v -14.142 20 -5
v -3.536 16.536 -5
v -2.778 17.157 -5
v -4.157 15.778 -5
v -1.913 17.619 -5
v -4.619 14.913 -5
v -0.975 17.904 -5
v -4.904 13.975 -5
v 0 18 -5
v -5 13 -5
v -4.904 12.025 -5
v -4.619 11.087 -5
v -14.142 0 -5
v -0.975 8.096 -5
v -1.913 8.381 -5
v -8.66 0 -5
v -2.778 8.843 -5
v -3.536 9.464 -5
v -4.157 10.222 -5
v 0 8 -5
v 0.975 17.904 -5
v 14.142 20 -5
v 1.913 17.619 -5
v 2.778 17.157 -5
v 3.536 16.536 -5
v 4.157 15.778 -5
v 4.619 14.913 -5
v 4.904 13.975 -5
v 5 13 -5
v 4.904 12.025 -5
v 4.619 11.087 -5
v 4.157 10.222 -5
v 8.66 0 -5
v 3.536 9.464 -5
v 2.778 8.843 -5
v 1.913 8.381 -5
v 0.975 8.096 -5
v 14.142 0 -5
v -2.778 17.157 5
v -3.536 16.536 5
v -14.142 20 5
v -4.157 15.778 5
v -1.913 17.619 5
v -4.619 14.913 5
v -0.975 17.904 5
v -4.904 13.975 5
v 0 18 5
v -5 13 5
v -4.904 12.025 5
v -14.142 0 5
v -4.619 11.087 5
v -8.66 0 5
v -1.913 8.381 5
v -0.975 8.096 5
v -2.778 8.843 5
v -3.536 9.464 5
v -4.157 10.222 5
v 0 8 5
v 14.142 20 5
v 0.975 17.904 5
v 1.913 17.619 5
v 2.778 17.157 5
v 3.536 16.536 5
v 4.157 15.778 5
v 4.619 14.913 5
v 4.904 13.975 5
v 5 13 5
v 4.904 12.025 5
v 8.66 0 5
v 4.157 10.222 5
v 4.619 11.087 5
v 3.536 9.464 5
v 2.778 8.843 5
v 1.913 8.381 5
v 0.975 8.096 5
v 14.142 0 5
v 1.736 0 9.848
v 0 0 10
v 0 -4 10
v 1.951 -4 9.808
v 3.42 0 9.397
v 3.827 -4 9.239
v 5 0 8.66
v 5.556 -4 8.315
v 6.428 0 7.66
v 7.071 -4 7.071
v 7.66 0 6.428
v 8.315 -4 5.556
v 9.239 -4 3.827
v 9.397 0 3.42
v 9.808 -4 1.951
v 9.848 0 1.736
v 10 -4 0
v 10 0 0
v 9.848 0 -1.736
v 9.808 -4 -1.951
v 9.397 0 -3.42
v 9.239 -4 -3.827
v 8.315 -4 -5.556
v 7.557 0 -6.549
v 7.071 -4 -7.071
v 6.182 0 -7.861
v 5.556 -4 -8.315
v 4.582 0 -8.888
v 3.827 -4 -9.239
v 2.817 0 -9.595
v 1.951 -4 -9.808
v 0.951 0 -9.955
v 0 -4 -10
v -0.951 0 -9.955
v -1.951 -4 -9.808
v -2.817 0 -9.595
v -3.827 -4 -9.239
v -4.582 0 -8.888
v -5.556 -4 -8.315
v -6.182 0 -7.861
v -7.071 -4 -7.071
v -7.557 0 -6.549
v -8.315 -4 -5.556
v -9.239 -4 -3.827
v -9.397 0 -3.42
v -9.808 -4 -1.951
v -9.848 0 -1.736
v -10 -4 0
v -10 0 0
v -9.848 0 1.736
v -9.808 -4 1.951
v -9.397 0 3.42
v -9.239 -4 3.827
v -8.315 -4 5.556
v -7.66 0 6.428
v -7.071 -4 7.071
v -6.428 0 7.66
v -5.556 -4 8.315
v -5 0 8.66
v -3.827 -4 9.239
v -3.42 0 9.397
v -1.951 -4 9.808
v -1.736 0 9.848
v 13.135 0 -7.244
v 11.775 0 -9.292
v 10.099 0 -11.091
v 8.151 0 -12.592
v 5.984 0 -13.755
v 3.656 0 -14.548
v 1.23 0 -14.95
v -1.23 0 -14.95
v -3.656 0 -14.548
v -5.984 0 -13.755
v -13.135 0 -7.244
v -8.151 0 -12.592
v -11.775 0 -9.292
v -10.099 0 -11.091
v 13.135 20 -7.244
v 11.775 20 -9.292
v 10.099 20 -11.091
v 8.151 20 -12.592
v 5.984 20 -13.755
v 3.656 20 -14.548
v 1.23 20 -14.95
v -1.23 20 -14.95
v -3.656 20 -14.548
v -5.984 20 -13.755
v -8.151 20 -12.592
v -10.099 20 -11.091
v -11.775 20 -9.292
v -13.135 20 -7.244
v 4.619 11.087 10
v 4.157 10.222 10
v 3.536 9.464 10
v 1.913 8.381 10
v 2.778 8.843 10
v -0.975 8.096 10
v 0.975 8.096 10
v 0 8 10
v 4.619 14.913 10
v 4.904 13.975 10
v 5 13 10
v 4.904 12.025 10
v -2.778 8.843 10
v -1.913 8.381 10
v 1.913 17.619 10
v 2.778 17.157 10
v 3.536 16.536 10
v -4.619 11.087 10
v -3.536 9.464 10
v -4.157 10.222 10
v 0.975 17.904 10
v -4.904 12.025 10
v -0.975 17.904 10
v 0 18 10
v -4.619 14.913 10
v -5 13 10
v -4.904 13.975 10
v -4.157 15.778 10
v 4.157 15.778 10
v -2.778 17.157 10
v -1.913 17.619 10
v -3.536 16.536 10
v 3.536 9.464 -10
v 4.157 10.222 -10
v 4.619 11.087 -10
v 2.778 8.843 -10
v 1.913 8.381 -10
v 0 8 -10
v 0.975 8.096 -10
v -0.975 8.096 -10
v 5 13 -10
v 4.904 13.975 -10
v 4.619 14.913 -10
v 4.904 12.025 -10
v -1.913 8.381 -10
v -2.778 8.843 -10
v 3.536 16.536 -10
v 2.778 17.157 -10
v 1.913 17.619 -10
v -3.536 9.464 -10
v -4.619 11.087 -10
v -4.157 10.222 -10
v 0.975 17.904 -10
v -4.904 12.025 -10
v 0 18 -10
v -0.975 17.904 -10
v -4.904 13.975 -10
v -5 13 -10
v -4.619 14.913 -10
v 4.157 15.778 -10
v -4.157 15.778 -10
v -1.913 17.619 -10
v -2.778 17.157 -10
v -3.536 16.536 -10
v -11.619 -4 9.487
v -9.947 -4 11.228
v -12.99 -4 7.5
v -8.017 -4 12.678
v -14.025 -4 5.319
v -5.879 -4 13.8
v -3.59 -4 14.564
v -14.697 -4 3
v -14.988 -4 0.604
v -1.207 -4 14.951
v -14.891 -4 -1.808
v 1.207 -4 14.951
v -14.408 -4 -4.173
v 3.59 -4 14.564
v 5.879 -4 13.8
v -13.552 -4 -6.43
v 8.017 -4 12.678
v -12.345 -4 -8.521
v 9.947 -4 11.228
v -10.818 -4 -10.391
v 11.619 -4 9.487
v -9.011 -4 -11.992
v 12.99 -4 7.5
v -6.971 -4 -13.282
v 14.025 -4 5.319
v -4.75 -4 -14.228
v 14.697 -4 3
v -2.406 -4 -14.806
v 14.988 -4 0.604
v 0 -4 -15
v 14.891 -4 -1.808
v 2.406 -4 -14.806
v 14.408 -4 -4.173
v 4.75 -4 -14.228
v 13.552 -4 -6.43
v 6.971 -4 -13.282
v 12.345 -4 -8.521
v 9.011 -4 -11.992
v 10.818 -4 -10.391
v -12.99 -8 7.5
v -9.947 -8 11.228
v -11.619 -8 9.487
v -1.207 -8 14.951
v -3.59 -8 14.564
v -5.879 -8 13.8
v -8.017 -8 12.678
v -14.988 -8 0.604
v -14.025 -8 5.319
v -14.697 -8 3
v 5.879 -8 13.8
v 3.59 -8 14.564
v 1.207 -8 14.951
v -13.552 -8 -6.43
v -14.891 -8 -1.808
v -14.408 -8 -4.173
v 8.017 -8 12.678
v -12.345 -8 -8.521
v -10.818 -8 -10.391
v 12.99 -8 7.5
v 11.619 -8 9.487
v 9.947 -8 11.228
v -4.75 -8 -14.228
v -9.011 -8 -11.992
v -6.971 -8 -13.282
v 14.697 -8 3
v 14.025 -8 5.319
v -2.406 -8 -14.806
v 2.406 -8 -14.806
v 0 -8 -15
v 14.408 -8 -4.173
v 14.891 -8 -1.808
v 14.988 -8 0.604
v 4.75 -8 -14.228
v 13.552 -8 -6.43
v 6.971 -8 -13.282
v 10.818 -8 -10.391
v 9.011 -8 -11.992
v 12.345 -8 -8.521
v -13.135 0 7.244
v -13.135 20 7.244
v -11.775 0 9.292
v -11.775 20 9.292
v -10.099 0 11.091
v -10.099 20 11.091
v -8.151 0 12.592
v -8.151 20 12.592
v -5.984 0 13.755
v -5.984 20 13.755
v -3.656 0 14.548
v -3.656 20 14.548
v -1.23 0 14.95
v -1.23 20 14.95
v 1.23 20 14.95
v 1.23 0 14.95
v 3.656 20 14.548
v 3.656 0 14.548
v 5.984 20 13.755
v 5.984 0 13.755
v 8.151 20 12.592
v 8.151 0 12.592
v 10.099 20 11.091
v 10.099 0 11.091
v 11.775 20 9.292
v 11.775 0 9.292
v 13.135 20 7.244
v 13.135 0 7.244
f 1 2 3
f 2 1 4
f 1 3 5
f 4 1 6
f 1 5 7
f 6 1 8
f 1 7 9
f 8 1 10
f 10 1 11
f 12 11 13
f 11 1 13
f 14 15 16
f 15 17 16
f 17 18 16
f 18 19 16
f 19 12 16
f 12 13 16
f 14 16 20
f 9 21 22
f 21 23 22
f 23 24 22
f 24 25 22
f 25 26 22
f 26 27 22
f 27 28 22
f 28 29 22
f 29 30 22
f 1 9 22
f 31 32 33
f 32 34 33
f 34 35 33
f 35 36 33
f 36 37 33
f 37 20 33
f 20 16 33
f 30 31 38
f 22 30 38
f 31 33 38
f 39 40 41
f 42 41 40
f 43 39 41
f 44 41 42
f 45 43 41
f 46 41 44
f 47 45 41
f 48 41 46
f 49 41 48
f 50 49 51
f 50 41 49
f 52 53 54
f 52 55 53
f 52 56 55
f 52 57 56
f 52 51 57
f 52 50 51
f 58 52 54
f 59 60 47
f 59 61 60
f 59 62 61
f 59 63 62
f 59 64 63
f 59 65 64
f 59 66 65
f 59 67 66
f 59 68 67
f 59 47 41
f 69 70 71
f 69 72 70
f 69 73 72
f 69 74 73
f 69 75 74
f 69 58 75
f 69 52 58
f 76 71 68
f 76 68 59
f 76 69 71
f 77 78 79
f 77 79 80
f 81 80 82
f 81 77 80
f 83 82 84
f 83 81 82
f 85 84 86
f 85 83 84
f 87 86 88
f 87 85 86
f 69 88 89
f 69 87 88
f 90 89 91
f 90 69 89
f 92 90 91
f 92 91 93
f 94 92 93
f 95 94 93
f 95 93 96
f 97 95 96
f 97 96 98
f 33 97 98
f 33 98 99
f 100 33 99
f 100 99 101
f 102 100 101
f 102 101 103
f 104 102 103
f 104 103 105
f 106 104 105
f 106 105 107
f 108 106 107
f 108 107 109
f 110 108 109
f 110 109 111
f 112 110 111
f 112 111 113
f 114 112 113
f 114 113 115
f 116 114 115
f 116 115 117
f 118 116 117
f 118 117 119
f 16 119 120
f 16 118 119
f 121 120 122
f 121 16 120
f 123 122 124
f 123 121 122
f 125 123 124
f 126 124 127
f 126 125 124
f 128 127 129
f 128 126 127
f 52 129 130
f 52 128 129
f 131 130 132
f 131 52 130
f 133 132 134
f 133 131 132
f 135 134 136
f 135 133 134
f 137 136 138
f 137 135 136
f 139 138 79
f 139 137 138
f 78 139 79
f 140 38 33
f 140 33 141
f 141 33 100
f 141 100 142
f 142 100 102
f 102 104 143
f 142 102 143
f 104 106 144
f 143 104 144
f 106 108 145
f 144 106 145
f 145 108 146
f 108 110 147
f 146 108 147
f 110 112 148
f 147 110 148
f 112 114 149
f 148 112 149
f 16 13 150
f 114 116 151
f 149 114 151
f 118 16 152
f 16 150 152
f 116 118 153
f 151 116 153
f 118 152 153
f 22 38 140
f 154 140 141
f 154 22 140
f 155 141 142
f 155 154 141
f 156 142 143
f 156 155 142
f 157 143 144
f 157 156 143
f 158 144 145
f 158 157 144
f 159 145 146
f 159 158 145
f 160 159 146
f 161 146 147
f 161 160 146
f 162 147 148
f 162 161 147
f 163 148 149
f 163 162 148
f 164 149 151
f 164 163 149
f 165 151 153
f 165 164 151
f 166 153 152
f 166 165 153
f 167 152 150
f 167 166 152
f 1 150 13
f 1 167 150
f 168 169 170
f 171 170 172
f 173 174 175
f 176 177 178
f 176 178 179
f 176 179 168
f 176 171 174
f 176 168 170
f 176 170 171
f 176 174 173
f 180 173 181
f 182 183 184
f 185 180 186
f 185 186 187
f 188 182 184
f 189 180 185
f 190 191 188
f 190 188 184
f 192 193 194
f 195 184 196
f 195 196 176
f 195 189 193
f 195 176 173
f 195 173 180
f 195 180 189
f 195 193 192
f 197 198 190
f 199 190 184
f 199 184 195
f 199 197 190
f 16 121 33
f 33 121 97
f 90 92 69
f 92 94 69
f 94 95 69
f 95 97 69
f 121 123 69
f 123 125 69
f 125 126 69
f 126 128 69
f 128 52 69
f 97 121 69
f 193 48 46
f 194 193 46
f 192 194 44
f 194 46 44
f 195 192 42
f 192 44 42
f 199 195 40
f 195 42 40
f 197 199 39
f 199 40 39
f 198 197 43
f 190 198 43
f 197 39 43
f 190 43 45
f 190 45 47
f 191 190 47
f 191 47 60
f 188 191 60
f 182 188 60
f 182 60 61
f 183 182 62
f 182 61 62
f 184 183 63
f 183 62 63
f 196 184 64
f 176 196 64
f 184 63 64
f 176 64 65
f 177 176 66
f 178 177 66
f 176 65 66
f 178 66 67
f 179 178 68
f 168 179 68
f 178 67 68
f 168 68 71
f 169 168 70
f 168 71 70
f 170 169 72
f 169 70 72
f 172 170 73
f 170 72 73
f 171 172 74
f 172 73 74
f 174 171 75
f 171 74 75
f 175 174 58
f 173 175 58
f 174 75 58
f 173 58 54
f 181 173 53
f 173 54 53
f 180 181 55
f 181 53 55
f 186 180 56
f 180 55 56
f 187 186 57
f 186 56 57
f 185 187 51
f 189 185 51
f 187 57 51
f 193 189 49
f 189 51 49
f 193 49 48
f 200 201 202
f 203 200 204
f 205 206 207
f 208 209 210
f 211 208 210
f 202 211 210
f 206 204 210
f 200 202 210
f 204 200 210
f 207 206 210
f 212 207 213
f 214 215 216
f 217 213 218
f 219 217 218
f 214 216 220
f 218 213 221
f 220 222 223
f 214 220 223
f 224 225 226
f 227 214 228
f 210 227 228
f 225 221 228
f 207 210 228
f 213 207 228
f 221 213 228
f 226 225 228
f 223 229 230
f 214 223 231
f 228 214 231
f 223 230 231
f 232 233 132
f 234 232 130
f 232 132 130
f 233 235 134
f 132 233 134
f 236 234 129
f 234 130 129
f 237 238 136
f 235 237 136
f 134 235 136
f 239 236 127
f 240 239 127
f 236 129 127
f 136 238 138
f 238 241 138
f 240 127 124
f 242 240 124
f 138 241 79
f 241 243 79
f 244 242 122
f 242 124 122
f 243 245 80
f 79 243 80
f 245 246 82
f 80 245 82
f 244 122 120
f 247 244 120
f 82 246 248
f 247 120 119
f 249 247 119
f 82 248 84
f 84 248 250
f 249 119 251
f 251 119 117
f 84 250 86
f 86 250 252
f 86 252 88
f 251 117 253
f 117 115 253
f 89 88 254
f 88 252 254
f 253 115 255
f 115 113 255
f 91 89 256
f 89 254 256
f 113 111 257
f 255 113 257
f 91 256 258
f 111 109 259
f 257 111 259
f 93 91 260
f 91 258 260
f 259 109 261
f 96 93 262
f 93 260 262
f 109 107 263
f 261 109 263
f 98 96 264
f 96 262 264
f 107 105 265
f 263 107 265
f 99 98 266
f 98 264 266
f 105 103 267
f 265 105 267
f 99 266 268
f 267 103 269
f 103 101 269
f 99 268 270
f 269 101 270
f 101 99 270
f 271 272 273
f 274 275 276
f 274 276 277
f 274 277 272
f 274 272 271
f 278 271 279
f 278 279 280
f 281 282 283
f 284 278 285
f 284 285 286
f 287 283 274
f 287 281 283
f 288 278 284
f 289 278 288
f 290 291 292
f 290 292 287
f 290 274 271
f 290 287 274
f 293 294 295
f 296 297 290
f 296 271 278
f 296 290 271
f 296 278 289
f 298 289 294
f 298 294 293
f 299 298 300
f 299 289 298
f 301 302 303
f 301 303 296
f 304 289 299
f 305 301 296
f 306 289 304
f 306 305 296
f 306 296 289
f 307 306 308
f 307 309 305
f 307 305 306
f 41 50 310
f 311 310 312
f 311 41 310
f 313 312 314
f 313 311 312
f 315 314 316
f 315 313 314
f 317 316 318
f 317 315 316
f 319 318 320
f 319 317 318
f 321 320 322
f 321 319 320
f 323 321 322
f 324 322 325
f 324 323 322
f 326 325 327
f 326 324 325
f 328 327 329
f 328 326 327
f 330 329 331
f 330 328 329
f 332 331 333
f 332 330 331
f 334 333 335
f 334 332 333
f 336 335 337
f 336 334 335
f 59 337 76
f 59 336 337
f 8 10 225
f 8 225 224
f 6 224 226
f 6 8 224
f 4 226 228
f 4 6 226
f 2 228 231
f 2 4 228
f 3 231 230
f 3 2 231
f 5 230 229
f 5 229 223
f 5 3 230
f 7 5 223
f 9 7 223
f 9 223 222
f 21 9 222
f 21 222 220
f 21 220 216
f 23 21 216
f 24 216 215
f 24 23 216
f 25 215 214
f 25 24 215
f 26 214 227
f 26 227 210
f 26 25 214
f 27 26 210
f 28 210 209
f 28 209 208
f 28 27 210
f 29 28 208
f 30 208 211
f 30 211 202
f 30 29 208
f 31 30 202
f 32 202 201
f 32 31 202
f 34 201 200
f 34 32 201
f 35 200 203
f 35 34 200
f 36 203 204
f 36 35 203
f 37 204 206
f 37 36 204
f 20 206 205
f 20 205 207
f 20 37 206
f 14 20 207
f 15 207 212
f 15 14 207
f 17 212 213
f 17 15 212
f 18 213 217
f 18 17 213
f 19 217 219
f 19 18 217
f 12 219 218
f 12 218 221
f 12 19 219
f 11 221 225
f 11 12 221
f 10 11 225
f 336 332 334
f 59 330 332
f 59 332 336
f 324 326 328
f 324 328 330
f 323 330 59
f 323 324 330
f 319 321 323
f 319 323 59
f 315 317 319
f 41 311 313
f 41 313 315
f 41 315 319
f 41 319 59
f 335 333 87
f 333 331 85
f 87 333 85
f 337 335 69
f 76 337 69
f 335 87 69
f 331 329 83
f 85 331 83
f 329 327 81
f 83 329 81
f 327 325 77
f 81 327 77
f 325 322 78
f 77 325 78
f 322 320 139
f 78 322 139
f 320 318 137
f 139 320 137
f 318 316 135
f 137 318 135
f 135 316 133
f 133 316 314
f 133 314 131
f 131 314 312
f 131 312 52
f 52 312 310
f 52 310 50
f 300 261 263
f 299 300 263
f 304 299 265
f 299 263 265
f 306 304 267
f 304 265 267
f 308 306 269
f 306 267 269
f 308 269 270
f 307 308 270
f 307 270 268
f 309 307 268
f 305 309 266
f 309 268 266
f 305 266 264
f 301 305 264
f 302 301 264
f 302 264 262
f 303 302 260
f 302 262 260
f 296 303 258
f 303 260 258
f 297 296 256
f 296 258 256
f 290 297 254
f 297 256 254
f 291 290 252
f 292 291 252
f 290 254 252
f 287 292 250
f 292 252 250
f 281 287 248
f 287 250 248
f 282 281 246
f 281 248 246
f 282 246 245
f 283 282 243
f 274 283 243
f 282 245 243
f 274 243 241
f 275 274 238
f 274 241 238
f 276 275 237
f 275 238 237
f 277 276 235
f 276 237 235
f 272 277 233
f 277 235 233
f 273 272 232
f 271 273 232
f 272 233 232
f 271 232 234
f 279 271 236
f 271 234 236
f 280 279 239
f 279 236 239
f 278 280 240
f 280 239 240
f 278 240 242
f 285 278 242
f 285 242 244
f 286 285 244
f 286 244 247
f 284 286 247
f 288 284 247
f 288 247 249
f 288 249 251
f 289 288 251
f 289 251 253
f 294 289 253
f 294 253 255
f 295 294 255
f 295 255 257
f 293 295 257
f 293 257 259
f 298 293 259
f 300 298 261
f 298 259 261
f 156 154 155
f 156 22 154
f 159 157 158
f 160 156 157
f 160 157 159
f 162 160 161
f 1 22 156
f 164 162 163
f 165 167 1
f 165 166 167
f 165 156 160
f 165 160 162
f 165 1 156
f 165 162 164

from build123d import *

# Parameters (mm, degrees)
SKETCH1_R           = 10
BOSS_EXTRUDE1_DEPTH = 4
SKETCH2_R           = 15
BOSS_EXTRUDE2_DEPTH = 4
BOSS_EXTRUDE3_START = 20
SKETCH3_R           = 15
BOSS_EXTRUDE3_DEPTH = 20
SKETCH6_W           = 30
SKETCH6_H           = 5
CUT_EXTRUDE2_DEPTH  = 30.154759474
SKETCH7_R           = 5
CUT_EXTRUDE5_DEPTH  = 5


with BuildPart() as part:
    # Sketch1 → Boss-Extrude1 (new body)
    with BuildSketch(Plane(origin=(0, 0, 0), x_dir=(1, 0, 0), z_dir=(0, 1, 0))):
        with Locations(Location((0, 0, 0), (0, 0, 270))):
            Circle(SKETCH1_R)
    extrude(amount=-BOSS_EXTRUDE1_DEPTH)

    # Sketch2 → Boss-Extrude2 (add)
    with BuildSketch(Plane.XZ.offset(4)):
        with Locations(Location((0, 0, 0), (0, 0, 270))):
            Circle(SKETCH2_R)
    extrude(amount=BOSS_EXTRUDE2_DEPTH)

    # Sketch3 → Boss-Extrude3 (add)
    with BuildSketch(Plane(origin=(0, 0, 0), x_dir=(1, 0, 0), z_dir=(0, 1, 0)).offset(BOSS_EXTRUDE3_START)):
        with Locations(Location((0, 0, 0), (0, 0, 90))):
            Circle(SKETCH3_R)
    extrude(amount=-BOSS_EXTRUDE3_DEPTH)

    # Sketch6 → Cut-Extrude2 (cut, through all)
    with BuildSketch(Plane(origin=(0, 0, 0), x_dir=(1, 0, 0), z_dir=(0, 1, 0))):
        with Locations((0, -2.5)):
            Rectangle(SKETCH6_W, SKETCH6_H)
    cut_extrude2 = extrude(amount=CUT_EXTRUDE2_DEPTH, mode=Mode.SUBTRACT)

    # Sketch7 → Cut-Extrude5 (cut)
    with BuildSketch(Plane(origin=(0, 0, 5), x_dir=(-1, 0, 0), z_dir=(0, 0, -1))):
        with Locations((0, 13)):
            Circle(SKETCH7_R)
    cut_extrude5 = extrude(amount=-CUT_EXTRUDE5_DEPTH, mode=Mode.SUBTRACT)

    # Mirror1: Cut-Extrude2, Cut-Extrude5 across plane
    add(cut_extrude2.mirror(Plane.XY), mode=Mode.SUBTRACT)
    add(cut_extrude5.mirror(Plane.XY), mode=Mode.SUBTRACT)


solid = part.part
